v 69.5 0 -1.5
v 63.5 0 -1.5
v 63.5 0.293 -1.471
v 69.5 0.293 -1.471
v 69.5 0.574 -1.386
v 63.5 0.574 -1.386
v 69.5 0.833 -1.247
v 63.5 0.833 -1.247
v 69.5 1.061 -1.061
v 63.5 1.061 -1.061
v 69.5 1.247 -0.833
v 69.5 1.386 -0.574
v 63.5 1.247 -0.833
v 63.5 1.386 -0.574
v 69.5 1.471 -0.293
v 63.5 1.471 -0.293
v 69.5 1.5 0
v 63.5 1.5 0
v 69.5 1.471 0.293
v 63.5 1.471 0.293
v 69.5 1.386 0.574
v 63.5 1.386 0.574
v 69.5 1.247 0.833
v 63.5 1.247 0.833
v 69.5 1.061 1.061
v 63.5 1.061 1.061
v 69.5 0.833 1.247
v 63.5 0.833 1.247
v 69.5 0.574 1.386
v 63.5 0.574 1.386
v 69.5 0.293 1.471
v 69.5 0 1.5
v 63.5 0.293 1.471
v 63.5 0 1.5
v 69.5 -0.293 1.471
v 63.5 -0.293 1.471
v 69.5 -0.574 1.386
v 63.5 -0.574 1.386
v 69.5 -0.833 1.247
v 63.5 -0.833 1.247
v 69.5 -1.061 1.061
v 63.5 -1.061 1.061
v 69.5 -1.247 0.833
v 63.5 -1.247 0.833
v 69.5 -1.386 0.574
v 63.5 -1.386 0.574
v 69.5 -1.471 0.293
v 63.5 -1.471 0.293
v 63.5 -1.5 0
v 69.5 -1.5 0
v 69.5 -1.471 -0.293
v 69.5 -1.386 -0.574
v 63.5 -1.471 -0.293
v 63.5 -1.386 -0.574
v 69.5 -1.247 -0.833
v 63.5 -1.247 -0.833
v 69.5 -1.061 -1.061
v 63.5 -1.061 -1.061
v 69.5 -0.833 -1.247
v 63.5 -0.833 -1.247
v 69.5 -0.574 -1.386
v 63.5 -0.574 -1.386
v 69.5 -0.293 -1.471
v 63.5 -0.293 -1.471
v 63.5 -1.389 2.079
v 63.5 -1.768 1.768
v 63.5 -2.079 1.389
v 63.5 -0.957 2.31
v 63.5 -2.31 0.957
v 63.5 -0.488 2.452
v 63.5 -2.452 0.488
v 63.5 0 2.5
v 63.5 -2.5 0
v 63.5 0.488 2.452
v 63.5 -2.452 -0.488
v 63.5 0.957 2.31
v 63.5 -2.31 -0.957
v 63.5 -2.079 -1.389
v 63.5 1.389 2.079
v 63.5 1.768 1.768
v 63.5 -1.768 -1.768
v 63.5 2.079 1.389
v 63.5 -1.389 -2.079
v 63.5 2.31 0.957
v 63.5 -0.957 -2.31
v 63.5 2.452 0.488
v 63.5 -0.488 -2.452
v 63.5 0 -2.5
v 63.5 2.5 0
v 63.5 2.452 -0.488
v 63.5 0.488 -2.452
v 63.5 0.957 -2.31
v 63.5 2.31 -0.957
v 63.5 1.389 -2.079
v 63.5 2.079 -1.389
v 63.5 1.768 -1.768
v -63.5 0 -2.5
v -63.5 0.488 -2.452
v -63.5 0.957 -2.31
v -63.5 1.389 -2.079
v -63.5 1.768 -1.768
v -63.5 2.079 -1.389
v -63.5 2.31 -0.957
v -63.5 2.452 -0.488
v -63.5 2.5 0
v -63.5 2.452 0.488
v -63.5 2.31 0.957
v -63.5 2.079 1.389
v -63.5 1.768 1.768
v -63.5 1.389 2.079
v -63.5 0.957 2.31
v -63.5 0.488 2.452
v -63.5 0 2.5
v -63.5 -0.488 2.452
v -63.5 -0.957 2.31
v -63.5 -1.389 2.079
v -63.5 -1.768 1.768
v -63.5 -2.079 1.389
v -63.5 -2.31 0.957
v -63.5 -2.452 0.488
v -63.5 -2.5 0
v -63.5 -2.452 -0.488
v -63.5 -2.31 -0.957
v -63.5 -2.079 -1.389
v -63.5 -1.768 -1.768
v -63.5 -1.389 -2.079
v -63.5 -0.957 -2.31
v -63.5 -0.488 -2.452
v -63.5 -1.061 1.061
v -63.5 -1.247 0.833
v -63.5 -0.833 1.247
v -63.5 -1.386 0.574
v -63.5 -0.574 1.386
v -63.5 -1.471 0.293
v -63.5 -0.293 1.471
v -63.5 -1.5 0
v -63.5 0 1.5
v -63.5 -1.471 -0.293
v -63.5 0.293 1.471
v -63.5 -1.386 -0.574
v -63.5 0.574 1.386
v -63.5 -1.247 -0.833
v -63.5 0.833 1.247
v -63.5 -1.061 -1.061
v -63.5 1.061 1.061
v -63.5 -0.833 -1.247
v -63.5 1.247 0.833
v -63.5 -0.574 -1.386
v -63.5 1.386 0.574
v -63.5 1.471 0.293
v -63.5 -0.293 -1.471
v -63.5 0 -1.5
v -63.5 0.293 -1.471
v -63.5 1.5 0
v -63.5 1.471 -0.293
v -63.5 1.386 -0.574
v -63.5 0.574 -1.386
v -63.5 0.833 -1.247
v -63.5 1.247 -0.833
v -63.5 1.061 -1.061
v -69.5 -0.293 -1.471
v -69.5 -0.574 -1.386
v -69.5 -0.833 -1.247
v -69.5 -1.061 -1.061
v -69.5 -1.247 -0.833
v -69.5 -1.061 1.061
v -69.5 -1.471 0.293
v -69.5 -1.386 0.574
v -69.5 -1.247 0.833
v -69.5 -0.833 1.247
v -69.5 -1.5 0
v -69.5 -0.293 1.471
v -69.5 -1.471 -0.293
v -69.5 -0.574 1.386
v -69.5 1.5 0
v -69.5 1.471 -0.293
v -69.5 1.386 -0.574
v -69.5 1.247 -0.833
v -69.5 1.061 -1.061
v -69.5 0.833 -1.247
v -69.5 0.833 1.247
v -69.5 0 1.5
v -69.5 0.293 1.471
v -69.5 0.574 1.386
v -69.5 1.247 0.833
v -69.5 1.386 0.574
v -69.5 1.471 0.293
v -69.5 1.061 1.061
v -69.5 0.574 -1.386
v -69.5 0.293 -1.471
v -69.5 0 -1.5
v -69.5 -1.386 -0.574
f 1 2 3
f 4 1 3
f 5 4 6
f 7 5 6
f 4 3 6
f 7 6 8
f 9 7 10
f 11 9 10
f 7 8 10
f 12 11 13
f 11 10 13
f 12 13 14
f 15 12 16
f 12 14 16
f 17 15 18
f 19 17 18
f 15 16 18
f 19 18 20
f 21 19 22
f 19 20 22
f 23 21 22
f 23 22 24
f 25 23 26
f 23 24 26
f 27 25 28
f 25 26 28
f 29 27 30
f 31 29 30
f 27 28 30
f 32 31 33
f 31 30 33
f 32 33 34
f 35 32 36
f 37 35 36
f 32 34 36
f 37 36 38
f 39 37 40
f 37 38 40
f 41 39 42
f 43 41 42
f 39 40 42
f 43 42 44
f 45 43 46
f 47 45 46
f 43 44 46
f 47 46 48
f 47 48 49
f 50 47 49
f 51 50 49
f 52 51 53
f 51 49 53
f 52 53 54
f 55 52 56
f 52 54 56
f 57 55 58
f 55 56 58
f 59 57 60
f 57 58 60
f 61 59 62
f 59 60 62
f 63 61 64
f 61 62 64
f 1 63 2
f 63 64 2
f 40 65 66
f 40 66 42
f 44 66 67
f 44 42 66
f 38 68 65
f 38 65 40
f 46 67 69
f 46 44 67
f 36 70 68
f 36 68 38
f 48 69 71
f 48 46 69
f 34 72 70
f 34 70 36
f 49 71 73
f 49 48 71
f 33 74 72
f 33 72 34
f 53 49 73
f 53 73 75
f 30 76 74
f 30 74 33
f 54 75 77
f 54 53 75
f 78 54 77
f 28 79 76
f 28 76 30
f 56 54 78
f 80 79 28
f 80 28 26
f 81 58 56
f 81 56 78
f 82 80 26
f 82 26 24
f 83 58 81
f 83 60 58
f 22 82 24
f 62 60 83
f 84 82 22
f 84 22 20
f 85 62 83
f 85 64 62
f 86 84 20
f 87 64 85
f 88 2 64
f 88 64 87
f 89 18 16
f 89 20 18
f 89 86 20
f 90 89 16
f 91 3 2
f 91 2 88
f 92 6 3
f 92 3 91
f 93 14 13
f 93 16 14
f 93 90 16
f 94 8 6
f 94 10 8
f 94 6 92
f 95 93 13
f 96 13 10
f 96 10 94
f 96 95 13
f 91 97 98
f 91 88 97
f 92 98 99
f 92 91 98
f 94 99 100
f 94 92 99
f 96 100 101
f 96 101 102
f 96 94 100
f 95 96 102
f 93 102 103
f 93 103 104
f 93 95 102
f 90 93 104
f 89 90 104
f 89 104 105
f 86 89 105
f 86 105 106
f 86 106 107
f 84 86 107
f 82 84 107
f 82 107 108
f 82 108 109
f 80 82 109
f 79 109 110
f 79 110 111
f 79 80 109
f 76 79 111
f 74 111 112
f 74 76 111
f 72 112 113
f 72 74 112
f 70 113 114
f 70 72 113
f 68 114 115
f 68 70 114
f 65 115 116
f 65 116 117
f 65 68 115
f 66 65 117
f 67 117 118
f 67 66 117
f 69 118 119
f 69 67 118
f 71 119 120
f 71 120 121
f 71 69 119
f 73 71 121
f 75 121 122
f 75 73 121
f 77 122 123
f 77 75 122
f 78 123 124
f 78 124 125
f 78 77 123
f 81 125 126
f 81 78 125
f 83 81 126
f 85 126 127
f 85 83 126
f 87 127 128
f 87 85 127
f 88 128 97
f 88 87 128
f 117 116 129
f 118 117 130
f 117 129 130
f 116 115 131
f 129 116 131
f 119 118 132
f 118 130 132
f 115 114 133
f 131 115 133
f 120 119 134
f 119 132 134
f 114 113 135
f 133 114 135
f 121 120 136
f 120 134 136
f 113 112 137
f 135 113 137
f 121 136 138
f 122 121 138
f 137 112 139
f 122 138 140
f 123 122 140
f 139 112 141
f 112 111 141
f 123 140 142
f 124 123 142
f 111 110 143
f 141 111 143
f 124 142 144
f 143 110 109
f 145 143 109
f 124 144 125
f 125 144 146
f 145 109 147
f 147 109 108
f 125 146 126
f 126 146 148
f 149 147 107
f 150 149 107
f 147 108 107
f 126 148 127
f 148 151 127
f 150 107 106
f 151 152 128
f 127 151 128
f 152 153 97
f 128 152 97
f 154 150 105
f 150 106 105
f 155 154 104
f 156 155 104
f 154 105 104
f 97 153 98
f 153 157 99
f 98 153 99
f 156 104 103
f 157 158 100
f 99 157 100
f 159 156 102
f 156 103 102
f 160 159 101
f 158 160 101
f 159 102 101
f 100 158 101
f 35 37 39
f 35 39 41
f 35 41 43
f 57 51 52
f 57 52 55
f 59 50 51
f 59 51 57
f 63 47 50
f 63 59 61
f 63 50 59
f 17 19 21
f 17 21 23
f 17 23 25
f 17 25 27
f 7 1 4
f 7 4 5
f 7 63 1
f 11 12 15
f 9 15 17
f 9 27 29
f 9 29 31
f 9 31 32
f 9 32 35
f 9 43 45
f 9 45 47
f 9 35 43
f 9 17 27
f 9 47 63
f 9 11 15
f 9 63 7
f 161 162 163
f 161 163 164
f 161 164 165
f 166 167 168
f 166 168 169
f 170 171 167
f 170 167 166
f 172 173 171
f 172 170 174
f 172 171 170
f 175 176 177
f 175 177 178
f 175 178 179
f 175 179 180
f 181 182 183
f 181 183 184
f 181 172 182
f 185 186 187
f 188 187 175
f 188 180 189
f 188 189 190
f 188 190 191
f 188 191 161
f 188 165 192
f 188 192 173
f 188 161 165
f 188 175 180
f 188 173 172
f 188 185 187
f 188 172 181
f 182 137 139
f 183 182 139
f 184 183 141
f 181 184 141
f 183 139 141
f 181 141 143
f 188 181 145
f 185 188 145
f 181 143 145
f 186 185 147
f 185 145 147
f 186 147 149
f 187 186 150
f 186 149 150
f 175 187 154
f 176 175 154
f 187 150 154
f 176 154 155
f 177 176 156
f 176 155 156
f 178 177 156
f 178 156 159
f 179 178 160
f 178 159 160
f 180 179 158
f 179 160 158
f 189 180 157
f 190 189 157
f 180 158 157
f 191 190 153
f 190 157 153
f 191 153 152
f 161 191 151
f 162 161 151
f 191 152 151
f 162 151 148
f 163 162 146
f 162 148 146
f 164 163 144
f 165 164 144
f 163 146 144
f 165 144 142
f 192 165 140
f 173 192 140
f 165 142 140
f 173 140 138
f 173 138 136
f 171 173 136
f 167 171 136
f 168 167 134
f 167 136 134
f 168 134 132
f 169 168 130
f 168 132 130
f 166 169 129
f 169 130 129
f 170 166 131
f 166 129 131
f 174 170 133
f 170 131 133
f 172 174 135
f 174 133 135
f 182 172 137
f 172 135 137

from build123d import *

# Parameters (mm, degrees)
SKETCH1_R           = 2.5
BOSS_EXTRUDE1_DEPTH = 63.5
SKETCH2_R           = 1.5
BOSS_EXTRUDE2_DEPTH = 6
SKETCH3_R           = 1.5
BOSS_EXTRUDE3_DEPTH = 6


with BuildPart() as part:
    # Sketch1 → Boss-Extrude1 (new body, symmetric)
    with BuildSketch(Plane(origin=(0, 0, 0), x_dir=(0, 0, -1), z_dir=(1, 0, 0))):
        Circle(SKETCH1_R)
    extrude(amount=BOSS_EXTRUDE1_DEPTH, both=True)

    # Sketch2 → Boss-Extrude2 (add)
    with BuildSketch(Plane(origin=(63.5, 0, 0), x_dir=(0, 0, -1), z_dir=(1, 0, 0))):
        Circle(SKETCH2_R)
    extrude(amount=BOSS_EXTRUDE2_DEPTH)

    # Sketch3 → Boss-Extrude3 (add)
    with BuildSketch(Plane.ZY.offset(63.5)):
        Circle(SKETCH3_R)
    extrude(amount=BOSS_EXTRUDE3_DEPTH)


solid = part.part
